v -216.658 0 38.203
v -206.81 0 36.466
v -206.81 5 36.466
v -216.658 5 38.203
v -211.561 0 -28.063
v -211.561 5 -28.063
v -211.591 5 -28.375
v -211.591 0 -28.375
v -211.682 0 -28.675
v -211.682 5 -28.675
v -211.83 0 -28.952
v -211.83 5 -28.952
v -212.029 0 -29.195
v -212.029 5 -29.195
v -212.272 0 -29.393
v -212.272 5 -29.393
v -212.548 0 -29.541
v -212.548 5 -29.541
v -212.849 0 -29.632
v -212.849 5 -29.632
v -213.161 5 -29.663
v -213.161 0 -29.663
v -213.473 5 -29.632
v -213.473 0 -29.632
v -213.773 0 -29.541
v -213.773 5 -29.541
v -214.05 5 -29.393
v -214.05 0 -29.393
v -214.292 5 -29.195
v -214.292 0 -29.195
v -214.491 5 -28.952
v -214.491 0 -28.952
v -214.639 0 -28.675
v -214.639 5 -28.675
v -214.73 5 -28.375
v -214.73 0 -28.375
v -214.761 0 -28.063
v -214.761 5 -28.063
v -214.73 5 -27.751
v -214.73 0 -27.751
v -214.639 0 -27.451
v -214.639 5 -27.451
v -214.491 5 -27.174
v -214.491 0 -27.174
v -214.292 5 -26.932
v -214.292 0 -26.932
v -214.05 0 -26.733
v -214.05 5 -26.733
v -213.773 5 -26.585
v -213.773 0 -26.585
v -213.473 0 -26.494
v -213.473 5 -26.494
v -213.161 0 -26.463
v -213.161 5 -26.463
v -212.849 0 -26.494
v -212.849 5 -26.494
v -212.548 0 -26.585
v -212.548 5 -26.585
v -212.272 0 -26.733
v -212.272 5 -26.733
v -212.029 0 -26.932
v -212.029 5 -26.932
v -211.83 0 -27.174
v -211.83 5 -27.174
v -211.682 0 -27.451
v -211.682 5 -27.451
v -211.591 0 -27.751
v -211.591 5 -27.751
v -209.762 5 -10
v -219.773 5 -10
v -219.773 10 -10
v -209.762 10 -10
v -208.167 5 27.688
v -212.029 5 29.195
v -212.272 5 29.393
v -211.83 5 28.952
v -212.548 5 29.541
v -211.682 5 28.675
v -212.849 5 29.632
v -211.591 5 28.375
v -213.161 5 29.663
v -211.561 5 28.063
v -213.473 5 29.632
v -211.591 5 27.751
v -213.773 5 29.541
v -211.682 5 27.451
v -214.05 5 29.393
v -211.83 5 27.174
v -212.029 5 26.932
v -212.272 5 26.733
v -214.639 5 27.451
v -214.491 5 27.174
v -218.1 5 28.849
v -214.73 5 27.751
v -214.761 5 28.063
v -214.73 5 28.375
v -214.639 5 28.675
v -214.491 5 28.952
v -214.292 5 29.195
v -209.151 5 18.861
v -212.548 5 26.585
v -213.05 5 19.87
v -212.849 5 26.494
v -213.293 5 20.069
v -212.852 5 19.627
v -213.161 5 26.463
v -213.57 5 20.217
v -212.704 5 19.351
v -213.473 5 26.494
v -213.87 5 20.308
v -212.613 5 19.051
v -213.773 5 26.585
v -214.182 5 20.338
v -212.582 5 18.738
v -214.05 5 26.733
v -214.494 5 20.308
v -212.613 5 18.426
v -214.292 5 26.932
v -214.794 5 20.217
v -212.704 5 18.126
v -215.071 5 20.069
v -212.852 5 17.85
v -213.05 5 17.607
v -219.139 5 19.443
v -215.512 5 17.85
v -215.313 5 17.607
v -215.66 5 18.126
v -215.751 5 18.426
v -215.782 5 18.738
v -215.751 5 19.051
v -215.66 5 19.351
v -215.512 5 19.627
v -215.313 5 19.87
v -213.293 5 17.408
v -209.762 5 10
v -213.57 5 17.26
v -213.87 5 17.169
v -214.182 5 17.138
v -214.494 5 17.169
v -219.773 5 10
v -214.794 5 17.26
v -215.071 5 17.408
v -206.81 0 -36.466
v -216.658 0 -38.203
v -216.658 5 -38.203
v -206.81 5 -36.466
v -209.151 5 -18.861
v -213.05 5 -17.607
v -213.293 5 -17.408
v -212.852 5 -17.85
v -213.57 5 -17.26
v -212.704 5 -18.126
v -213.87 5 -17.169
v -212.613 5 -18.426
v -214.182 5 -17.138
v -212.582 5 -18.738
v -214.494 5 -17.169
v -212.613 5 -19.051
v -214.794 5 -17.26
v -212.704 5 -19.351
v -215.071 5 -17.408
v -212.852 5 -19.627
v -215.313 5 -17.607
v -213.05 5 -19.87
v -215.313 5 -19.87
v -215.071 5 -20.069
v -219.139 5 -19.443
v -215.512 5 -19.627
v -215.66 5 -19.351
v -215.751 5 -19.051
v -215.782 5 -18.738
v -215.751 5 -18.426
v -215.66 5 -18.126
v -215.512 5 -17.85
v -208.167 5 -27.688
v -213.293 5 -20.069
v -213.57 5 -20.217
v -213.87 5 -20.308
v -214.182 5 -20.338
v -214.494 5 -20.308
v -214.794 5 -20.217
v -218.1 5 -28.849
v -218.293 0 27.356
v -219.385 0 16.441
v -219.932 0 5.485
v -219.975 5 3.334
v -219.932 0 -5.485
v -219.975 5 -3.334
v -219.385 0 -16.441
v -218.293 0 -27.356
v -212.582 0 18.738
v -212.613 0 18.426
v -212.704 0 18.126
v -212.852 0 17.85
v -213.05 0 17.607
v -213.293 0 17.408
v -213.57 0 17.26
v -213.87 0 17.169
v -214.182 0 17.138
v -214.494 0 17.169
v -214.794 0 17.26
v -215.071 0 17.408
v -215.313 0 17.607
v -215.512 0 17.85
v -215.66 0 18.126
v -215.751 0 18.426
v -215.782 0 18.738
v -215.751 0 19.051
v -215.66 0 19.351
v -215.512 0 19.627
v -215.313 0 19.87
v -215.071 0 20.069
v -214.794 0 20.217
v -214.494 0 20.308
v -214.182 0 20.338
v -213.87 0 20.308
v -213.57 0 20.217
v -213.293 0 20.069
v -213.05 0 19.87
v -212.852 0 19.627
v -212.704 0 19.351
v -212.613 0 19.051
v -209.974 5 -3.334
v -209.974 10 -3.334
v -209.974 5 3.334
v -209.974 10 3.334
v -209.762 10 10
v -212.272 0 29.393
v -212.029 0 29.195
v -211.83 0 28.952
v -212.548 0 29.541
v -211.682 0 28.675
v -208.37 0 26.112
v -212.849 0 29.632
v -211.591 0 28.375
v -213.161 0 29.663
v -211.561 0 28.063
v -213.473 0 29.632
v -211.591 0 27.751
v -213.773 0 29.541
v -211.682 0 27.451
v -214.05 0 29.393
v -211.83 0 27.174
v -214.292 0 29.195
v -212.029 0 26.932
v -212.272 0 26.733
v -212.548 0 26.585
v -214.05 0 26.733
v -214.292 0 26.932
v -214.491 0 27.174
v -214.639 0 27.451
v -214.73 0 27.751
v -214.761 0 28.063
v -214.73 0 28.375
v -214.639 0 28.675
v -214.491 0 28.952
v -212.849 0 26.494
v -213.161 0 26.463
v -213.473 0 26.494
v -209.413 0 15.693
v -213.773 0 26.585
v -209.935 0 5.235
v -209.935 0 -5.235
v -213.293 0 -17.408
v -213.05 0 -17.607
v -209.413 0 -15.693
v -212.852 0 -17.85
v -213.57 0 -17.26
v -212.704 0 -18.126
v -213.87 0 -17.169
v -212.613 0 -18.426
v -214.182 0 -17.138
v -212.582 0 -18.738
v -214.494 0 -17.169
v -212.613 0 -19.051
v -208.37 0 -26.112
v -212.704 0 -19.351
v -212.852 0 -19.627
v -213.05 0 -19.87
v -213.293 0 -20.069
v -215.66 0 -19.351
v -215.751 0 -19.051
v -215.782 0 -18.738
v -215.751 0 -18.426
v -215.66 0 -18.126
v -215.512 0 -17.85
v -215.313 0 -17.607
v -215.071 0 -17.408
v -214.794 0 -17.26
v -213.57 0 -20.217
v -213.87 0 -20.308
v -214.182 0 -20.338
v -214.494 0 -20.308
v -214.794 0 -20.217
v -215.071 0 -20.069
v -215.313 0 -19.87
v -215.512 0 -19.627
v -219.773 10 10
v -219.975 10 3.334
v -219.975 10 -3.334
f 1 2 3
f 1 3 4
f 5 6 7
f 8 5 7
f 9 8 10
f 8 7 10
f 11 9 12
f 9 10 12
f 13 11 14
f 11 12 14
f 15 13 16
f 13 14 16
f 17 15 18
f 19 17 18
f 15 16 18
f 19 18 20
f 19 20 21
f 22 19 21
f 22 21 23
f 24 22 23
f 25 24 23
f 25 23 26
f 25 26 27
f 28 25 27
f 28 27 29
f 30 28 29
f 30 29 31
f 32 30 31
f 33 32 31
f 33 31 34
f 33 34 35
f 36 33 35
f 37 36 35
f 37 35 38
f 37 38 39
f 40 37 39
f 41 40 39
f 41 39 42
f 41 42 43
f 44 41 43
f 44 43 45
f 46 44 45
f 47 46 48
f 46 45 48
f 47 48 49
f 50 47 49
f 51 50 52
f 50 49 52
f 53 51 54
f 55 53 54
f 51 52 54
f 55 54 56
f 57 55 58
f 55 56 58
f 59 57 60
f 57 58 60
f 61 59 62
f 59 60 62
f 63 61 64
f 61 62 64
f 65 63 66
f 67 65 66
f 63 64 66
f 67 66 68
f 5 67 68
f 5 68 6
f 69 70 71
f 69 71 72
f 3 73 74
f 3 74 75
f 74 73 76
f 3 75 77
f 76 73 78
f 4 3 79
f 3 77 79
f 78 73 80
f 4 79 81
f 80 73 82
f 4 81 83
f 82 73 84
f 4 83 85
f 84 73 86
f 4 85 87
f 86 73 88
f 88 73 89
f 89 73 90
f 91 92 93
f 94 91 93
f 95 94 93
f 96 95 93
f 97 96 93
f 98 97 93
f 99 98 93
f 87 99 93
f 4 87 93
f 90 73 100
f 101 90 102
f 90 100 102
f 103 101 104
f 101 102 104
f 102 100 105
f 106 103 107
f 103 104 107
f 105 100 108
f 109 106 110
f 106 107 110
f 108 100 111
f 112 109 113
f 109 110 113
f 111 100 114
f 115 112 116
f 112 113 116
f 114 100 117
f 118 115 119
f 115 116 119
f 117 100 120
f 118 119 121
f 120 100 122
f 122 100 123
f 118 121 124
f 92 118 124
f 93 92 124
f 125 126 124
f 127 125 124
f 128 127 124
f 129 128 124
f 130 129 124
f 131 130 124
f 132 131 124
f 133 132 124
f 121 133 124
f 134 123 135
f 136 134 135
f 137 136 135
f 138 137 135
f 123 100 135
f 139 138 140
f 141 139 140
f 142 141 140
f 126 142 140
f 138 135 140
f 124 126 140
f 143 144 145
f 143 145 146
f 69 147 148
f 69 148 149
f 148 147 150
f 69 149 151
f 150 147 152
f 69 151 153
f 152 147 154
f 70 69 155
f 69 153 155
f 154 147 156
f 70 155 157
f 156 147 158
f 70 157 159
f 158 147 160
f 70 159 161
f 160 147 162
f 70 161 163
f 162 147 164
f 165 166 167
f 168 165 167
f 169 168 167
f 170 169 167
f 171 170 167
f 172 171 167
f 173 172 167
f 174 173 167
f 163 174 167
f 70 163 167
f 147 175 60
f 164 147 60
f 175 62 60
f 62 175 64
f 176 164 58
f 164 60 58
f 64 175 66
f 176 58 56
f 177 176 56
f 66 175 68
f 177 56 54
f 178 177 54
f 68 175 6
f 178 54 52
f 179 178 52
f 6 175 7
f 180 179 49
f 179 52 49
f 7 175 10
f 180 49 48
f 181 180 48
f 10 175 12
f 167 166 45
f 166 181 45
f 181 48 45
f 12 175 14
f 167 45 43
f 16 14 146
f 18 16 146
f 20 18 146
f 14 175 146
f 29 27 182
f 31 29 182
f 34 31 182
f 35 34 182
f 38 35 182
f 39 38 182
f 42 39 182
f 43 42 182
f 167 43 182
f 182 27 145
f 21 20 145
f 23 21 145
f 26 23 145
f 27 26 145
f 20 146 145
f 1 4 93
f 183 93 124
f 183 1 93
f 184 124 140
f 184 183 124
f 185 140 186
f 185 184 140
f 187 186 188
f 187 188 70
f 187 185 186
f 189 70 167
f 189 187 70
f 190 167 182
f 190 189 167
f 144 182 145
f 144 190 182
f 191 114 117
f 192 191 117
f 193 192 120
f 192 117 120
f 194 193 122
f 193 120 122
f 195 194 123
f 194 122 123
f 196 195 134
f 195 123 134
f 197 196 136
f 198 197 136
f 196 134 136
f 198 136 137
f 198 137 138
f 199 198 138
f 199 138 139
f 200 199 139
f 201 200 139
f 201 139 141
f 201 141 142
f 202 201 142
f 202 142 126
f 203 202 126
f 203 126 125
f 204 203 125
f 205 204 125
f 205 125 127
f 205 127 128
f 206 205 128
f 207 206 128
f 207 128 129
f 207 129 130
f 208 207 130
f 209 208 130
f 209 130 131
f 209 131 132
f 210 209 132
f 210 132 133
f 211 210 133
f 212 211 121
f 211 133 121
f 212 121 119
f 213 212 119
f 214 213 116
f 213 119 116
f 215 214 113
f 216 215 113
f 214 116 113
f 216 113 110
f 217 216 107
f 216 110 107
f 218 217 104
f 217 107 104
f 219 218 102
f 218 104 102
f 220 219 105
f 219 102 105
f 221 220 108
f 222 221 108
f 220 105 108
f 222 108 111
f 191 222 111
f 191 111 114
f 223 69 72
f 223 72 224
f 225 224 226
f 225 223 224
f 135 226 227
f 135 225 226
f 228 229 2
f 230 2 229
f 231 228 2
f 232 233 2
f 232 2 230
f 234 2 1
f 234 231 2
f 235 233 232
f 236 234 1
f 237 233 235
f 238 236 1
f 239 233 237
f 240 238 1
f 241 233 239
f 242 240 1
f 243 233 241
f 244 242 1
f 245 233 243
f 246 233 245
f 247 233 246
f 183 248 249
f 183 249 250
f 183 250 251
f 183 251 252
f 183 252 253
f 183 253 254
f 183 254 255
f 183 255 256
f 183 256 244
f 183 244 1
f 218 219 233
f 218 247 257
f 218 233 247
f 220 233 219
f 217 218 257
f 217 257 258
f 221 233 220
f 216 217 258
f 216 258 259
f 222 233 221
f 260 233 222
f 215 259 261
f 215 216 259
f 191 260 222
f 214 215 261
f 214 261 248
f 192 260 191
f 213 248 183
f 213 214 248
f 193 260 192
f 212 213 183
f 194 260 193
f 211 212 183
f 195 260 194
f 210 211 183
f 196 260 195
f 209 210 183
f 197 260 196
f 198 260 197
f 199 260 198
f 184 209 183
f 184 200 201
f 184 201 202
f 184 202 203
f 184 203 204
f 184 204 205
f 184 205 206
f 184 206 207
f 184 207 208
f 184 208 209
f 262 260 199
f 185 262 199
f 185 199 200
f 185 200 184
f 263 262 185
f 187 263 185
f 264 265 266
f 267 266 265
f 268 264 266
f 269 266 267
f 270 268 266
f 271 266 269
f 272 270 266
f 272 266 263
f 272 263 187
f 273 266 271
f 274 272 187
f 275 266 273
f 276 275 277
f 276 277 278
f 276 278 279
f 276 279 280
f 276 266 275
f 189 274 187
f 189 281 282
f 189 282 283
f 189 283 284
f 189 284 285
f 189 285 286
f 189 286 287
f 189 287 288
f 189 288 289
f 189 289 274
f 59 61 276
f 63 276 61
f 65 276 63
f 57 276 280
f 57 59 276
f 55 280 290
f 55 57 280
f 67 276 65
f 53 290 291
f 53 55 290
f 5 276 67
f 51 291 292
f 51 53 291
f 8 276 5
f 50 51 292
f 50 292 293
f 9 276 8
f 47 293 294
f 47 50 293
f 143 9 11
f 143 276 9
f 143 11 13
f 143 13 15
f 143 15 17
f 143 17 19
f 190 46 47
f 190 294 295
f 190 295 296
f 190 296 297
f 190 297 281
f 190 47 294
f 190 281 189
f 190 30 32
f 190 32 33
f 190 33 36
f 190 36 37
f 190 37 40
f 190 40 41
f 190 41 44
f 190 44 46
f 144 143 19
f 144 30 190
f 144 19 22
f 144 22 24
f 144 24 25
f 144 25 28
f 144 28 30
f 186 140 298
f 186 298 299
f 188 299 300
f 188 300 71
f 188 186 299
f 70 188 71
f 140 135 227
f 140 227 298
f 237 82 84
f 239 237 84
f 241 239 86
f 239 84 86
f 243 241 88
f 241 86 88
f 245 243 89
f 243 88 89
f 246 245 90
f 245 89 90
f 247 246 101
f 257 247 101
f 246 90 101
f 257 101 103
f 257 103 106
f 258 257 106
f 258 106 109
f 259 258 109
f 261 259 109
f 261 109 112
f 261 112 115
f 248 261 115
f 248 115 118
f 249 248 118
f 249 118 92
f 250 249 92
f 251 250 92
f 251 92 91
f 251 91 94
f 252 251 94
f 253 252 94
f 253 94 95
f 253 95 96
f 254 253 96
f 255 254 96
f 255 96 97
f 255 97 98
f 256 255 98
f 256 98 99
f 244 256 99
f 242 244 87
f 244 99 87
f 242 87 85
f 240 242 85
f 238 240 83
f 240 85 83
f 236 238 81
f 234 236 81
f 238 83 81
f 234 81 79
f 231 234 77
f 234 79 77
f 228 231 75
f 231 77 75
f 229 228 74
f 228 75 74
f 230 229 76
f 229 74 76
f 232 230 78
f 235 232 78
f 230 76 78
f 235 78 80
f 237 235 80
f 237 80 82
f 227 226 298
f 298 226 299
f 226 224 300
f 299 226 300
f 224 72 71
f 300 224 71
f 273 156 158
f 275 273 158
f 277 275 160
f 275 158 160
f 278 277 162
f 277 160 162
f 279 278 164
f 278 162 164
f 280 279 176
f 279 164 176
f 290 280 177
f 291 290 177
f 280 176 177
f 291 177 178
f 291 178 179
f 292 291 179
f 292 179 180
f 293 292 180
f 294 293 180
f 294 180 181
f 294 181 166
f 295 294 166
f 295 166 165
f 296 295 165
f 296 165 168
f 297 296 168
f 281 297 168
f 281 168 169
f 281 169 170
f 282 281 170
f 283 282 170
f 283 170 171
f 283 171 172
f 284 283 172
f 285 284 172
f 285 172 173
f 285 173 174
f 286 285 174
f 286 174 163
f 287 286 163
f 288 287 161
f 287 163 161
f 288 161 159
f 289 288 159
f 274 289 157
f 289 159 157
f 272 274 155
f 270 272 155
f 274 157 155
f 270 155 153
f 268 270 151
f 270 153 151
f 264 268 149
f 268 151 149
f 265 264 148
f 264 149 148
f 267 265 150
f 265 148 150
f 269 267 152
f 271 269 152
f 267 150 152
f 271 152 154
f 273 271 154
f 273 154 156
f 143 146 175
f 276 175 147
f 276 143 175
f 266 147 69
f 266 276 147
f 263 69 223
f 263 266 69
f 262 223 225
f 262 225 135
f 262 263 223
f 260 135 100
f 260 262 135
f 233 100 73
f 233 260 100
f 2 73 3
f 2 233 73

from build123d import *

# Parameters (mm, degrees)
BOSS_EXTRUDE1_DEPTH        = 5
F_3_2_3_2_DIAMETER_HOLE1_D = 3.2
BOSS_EXTRUDE2_DEPTH        = 5


with BuildPart() as part:
    # Sketch1 → Boss-Extrude1 (new body)
    with BuildSketch(Plane(origin=(0, 0, 0), x_dir=(1, 0, 0), z_dir=(0, 1, 0))):
        with BuildLine():
            Line((-216.657705663, 38.202599087), (-206.809628133, 36.46611731))
            ThreePointArc((-206.809628133, 36.46611731), (-210, 0), (-206.809628133, -36.46611731))
            Line((-206.809628133, -36.46611731), (-216.657705663, -38.202599087))
            ThreePointArc((-216.657705663, -38.202599087), (-220, 0), (-216.657705663, 38.202599087))
        make_face()
    extrude(amount=BOSS_EXTRUDE1_DEPTH)

    # Ø3.2 (3.2) Diameter Hole1 (through all)
    with Locations(Plane(origin=(0, 0, 0), x_dir=(-1, 0, 0), z_dir=(0, -1, 0))):
        with Locations((214.18186009, -18.738484691), (214.18186009, 18.738484691), (213.160645195, -28.063131327), (213.160645195, 28.063131327)):
            Hole(F_3_2_3_2_DIAMETER_HOLE1_D / 2)

    # Sketch9 → Boss-Extrude2 (add)
    with BuildSketch(Plane(origin=(0, 5, 0), x_dir=(1, 0, 0), z_dir=(0, 1, 0))):
        with BuildLine():
            Line((-219.772609758, 10), (-209.761769634, 10))
            ThreePointArc((-209.761769634, 10), (-210, 0), (-209.761769634, -10))
            Line((-209.761769634, -10), (-219.772609758, -10))
            ThreePointArc((-219.772609758, -10), (-220, 0), (-219.772609758, 10))
        make_face()
    extrude(amount=BOSS_EXTRUDE2_DEPTH)


solid = part.part
